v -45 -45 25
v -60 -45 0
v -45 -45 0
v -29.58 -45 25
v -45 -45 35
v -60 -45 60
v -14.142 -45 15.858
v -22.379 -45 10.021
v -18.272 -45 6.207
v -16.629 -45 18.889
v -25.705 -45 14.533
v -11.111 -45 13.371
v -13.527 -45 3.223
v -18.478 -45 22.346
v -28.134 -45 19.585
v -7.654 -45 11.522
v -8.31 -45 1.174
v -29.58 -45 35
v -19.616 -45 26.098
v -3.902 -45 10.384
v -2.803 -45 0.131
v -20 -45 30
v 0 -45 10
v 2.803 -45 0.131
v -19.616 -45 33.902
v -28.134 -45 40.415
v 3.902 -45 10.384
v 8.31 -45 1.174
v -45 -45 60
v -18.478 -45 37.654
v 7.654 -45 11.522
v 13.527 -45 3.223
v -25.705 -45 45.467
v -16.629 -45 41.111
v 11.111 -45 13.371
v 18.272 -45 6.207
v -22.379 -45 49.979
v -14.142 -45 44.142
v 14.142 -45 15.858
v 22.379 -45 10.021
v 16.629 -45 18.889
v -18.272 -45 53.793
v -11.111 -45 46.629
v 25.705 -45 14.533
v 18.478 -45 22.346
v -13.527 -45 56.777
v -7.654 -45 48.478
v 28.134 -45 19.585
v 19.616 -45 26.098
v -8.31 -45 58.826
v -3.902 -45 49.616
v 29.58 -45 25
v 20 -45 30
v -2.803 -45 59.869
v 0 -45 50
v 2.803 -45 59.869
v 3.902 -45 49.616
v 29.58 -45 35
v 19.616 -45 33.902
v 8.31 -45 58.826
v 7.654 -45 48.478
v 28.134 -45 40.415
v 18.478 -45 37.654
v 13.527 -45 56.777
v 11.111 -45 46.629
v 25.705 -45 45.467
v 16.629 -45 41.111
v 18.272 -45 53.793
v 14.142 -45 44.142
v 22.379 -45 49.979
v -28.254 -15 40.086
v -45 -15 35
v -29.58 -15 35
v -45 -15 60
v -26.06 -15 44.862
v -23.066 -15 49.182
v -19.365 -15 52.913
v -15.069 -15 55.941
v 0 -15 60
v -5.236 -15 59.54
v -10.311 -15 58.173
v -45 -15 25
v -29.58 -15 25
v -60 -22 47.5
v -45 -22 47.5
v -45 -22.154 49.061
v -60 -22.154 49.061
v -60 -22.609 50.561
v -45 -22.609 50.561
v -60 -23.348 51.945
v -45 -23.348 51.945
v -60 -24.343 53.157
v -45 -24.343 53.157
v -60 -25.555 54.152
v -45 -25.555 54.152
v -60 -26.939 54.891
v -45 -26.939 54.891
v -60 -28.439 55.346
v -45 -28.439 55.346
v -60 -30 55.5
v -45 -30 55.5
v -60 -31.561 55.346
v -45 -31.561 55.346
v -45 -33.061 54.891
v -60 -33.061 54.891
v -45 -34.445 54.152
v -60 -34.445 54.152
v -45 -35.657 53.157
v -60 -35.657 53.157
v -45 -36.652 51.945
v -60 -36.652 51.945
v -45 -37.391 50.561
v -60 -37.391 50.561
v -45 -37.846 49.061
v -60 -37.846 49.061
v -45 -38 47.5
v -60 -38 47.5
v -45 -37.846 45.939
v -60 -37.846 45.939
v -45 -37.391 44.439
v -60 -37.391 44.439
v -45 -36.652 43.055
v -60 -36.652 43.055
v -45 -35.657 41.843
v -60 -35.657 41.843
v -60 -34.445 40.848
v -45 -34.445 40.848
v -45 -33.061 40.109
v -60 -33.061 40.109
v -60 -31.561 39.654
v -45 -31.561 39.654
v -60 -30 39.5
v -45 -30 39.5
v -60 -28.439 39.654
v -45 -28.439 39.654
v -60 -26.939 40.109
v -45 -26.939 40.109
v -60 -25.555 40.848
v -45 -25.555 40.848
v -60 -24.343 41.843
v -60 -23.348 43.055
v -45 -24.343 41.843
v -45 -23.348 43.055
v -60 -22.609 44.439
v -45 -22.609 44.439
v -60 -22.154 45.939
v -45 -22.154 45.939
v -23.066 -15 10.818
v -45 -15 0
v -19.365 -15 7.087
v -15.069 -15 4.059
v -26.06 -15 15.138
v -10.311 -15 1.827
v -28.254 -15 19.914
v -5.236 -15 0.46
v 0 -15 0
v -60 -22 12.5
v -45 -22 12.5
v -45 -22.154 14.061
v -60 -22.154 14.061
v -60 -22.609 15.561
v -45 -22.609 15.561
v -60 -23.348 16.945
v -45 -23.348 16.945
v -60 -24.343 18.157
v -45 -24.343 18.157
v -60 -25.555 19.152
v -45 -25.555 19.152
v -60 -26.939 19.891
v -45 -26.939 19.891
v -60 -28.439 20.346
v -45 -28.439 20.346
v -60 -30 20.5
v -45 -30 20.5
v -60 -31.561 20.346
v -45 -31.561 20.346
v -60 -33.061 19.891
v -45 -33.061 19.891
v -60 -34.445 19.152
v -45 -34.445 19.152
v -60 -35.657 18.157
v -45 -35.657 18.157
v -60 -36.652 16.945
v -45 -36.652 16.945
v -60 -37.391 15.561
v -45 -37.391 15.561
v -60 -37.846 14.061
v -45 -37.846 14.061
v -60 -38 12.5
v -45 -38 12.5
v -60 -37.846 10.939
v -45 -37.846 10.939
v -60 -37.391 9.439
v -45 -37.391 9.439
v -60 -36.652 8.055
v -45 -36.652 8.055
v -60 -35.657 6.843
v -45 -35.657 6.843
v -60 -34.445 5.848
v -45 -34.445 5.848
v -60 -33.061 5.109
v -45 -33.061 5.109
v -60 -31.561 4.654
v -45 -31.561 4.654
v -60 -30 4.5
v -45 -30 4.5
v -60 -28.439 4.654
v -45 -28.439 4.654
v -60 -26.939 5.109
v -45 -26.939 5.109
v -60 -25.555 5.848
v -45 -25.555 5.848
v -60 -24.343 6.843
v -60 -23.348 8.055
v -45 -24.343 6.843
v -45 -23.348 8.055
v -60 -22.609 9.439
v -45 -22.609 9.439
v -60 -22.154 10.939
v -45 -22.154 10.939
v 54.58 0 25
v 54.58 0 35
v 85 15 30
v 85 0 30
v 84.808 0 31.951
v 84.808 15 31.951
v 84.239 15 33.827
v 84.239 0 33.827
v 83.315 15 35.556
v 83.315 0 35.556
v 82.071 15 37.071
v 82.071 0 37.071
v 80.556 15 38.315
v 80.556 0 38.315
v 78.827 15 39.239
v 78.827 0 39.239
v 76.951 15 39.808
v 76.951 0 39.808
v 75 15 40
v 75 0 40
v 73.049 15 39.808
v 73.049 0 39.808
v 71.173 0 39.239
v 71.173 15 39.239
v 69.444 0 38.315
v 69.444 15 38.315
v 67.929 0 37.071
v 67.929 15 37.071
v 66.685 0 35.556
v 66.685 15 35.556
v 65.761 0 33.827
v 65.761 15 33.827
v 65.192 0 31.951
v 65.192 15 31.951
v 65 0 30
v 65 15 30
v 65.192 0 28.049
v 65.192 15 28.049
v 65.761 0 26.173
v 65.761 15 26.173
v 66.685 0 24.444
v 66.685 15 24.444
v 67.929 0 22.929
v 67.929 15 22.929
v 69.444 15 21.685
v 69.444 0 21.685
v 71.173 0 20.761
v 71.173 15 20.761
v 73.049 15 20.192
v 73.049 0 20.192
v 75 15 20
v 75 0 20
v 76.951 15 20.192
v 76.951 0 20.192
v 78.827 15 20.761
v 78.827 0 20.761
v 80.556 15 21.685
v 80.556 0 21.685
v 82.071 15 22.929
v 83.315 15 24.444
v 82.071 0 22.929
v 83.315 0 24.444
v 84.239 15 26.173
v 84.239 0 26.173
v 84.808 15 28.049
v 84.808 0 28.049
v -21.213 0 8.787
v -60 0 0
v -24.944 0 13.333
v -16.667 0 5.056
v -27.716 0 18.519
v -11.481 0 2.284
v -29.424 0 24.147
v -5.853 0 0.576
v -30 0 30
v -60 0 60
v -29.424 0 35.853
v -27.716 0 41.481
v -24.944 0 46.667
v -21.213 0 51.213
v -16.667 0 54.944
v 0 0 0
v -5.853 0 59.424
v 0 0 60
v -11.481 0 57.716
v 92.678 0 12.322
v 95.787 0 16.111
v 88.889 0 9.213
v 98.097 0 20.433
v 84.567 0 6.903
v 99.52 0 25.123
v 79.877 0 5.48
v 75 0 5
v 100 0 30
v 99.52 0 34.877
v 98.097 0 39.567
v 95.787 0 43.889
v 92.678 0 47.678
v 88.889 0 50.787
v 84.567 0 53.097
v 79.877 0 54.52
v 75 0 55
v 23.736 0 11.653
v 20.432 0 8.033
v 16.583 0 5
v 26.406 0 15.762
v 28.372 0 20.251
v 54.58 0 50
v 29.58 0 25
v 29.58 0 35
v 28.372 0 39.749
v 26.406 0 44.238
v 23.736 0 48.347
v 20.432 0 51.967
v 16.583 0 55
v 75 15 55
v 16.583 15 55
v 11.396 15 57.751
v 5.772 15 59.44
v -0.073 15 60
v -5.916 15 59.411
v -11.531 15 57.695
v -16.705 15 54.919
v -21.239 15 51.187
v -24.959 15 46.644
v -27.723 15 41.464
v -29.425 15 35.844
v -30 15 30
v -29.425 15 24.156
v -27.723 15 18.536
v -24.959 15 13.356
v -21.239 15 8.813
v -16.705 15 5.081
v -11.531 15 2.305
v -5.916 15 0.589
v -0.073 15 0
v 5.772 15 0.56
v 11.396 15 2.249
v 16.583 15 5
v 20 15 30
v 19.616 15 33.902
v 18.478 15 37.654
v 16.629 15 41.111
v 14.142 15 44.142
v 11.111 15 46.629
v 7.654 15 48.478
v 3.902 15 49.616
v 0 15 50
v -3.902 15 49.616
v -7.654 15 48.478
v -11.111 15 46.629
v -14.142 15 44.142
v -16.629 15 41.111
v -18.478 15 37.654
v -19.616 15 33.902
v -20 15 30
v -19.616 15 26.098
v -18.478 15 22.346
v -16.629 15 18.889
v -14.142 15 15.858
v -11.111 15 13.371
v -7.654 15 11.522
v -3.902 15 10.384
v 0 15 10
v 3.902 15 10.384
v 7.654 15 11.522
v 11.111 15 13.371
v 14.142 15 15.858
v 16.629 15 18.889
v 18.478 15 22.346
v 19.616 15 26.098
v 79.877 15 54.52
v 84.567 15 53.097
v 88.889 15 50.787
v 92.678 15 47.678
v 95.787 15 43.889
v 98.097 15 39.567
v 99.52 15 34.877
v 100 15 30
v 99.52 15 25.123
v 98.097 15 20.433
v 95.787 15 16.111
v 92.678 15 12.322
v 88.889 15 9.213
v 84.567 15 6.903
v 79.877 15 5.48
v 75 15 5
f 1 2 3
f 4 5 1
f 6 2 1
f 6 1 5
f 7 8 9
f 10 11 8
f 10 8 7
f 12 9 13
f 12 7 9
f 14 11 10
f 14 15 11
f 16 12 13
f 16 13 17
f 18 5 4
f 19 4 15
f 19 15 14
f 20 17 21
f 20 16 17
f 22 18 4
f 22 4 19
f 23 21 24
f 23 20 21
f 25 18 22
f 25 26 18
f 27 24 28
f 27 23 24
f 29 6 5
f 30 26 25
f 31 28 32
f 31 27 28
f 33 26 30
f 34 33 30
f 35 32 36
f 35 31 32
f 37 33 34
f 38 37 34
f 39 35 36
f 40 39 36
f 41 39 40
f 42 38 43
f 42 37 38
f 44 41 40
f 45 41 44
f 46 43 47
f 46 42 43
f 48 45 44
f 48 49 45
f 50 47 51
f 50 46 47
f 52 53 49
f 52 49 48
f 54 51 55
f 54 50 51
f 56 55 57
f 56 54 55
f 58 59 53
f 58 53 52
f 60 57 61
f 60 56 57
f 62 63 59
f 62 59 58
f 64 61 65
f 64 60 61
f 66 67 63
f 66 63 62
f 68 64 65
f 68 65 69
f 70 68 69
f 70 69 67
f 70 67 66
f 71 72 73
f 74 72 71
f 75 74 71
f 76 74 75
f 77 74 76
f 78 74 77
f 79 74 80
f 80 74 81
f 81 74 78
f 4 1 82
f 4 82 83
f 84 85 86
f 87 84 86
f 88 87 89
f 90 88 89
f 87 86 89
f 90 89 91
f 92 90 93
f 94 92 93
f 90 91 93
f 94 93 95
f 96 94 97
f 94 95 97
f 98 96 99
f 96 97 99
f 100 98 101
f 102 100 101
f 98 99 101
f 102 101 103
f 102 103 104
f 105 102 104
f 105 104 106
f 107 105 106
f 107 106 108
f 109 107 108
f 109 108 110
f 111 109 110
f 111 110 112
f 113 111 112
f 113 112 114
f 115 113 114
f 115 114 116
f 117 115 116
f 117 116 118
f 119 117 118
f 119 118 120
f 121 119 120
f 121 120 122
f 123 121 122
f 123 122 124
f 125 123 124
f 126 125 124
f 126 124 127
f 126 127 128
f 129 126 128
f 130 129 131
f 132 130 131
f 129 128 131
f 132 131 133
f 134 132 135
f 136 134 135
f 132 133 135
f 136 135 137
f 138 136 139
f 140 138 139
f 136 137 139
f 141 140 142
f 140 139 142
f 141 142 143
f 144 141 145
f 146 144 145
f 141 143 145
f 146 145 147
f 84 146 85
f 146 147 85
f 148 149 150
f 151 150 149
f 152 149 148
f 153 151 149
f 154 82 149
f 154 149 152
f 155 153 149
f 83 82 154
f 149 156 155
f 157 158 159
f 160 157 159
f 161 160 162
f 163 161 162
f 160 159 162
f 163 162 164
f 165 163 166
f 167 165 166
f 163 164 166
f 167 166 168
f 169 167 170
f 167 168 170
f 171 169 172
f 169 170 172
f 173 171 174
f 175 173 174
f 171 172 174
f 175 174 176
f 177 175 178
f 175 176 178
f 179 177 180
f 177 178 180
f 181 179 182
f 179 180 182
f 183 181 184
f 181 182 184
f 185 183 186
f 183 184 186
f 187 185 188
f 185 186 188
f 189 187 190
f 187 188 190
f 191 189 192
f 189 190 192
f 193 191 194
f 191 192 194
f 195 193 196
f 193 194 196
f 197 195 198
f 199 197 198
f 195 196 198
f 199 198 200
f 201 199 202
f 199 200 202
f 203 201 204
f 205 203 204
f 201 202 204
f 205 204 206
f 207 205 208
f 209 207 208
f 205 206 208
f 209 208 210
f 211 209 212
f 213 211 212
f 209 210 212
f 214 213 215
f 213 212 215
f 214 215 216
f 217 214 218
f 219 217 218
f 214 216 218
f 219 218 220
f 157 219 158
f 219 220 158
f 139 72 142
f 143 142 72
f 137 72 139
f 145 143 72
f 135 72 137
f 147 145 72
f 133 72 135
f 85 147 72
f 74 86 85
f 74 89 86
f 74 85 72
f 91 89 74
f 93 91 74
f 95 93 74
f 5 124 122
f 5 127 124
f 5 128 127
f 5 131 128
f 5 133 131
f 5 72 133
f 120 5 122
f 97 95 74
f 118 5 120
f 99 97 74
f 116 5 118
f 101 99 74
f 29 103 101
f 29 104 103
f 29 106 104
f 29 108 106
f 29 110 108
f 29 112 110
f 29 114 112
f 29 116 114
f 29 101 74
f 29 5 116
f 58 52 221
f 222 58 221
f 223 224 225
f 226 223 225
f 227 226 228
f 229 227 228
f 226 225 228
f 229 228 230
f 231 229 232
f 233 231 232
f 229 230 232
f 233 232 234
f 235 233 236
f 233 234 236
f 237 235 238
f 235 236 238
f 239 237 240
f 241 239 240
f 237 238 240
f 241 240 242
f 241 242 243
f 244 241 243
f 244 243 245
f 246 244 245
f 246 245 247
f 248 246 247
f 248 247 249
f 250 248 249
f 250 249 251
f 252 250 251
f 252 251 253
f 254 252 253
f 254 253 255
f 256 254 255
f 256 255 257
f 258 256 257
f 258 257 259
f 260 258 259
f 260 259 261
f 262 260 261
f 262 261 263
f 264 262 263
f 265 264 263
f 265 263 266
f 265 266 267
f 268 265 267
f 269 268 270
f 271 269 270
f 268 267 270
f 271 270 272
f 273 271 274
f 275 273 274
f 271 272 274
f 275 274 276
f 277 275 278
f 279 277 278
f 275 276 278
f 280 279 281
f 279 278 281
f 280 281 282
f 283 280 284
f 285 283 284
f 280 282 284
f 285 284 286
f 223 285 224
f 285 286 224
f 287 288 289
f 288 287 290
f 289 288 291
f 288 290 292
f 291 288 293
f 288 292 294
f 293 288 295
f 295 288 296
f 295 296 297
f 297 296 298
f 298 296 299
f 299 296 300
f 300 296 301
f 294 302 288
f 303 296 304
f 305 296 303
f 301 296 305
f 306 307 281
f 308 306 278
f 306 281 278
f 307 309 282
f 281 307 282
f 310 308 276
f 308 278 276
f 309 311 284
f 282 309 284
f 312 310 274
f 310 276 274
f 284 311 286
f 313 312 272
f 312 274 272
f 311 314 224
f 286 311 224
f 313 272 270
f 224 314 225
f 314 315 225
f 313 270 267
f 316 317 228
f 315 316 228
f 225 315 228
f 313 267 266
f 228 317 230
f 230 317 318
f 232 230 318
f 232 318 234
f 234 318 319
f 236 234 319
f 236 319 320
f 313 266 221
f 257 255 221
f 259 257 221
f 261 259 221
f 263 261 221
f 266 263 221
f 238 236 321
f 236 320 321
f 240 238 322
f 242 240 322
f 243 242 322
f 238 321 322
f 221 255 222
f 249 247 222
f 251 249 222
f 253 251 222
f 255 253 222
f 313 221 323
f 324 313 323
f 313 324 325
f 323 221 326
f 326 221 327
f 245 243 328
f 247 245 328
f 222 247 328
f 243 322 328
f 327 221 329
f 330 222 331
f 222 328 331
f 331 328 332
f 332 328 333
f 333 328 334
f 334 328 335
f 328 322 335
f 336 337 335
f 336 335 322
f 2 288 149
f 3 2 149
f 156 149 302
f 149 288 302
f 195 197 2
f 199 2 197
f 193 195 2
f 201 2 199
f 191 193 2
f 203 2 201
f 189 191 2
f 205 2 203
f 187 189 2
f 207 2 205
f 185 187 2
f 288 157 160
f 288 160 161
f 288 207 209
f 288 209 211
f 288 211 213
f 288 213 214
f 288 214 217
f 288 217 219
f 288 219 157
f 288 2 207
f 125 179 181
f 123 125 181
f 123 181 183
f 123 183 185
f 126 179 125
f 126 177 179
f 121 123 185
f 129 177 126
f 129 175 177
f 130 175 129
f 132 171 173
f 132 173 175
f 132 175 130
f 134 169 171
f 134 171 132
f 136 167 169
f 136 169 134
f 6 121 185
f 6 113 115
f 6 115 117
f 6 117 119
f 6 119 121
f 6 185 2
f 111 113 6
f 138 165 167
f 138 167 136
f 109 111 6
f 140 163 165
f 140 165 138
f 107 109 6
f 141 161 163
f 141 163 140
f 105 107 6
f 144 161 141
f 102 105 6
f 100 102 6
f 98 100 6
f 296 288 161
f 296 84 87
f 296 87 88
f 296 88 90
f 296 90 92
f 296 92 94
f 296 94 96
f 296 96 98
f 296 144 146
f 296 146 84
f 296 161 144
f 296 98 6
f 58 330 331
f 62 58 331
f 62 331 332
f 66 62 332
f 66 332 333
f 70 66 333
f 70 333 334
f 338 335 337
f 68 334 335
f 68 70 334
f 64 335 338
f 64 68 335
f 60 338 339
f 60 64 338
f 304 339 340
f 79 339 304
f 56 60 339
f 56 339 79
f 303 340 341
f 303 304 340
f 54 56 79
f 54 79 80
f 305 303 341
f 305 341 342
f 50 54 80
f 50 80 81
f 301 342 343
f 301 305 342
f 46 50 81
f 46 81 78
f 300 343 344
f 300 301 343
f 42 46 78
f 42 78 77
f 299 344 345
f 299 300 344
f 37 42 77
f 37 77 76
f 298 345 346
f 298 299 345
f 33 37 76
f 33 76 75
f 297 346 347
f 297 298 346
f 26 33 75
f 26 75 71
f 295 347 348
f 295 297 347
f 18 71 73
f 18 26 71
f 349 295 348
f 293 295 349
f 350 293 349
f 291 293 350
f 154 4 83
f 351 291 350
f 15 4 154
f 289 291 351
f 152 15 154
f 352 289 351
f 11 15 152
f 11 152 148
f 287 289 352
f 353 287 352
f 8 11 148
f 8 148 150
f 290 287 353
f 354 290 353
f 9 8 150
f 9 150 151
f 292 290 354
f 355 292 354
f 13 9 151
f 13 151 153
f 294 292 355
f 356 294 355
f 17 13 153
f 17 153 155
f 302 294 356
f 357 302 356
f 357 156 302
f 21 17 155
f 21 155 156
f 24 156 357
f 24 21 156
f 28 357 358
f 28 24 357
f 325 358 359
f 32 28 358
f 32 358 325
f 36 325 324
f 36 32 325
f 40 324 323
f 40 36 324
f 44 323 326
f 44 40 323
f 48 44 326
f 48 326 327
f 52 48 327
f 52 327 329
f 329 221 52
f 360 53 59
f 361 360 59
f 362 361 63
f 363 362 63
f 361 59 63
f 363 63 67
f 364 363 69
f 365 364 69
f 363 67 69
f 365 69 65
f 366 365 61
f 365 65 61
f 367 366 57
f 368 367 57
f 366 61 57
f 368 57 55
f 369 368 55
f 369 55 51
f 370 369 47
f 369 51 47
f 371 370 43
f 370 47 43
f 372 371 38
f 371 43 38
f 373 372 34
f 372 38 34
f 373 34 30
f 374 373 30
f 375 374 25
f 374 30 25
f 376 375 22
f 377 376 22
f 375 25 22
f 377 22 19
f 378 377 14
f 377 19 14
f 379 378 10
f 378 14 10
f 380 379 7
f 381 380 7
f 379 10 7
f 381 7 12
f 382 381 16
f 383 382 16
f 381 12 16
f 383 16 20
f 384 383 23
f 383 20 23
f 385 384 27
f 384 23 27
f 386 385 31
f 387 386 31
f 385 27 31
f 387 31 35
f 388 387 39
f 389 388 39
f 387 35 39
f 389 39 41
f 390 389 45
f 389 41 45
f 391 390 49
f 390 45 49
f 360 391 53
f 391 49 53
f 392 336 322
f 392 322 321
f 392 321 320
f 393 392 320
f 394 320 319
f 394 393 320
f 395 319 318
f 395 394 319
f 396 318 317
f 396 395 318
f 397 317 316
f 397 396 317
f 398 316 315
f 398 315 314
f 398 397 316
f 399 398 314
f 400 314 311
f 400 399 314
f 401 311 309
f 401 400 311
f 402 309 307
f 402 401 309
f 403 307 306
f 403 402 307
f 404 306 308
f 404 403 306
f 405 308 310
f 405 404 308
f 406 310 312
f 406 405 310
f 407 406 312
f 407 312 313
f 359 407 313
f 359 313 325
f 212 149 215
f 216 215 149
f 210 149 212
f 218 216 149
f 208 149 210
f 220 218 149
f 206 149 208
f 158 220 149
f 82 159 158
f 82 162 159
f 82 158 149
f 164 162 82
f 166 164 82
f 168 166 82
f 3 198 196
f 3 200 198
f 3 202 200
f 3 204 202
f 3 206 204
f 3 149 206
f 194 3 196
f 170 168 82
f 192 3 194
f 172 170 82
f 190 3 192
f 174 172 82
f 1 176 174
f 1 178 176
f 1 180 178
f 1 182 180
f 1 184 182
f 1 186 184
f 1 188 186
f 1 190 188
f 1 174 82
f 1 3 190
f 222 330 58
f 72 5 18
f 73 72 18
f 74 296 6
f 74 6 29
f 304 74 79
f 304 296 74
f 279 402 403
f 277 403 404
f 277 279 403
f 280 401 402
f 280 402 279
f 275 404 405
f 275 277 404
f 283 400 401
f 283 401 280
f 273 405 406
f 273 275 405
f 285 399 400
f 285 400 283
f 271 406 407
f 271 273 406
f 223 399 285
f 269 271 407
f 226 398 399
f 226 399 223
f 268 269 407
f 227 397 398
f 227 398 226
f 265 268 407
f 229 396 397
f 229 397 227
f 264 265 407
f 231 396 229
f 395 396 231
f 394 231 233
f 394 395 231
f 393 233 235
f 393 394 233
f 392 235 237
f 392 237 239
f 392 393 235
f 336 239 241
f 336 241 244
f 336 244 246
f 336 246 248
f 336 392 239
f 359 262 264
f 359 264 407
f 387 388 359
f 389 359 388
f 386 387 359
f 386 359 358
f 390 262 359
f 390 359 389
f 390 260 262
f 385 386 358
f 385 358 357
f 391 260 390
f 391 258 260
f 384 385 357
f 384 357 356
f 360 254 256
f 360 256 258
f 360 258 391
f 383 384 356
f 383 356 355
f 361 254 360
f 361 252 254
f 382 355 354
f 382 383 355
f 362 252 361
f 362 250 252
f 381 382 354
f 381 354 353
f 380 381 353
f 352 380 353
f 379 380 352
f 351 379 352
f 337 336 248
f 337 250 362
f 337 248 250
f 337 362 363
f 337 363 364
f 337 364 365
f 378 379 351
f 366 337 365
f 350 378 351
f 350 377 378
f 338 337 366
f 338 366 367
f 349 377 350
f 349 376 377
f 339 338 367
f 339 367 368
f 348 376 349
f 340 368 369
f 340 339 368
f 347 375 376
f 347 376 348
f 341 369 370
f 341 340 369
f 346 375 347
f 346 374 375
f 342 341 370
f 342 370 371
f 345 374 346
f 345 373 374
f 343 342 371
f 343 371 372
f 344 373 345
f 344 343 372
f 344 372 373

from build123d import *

# Parameters (mm, degrees)
F0_W      = 60
F0_H      = 60
F1_DEPTH  = 45
F2_W      = 45
F2_H      = 25
F3_DEPTH  = 30
F4_R      = 8
F5_DEPTH  = 15
F6_R      = 8
F7_DEPTH  = 25
F8_R      = 30
F9_DEPTH  = 60
F10_R     = 20
F11_DEPTH = 60
F13_DEPTH = 15
F14_R     = 10
F15_DEPTH = 25
F17_DEPTH = 60
F19_DEPTH = 25


with BuildPart() as f1:
    # F0 (on Front) → F1 (new body)
    with BuildSketch(Plane.XZ):
        with Locations((-30, 30)):
            Rectangle(F0_W, F0_H)
    extrude(amount=F1_DEPTH)

    # F2 (on face) → F3 (cut)
    with BuildSketch(Plane.XZ.offset(45)):
        with Locations((-22.5, 12.5)):
            Rectangle(F2_W, F2_H)
        with Locations((-22.5, 47.5)):
            Rectangle(F2_W, F2_H)
    extrude(amount=-F3_DEPTH, mode=Mode.SUBTRACT)

    # F4 (on face) → F5 (cut)
    with BuildSketch(Plane.YZ.offset(-45)):
        with Locations((-30, 12.5)):
            Circle(F4_R)
    extrude(amount=-F5_DEPTH, mode=Mode.SUBTRACT)

    # F6 (on face) → F7 (cut)
    with BuildSketch(Plane.YZ.offset(-45)):
        with Locations((-30, 47.5)):
            Circle(F6_R)
    extrude(amount=-F7_DEPTH, mode=Mode.SUBTRACT)

    # F8 (on face) → F9 (join)
    with BuildSketch(Plane.XZ.offset(45)):
        with Locations((0, 30)):
            Circle(F8_R)
    extrude(amount=-F9_DEPTH)

    # F10 (on face) → F11 (cut)
    with BuildSketch(Plane.XZ.offset(45)):
        with Locations((0, 30)):
            Circle(F10_R)
    extrude(amount=-F11_DEPTH, mode=Mode.SUBTRACT)

    # F12 (on face) → F13 (join)
    with BuildSketch(Plane(origin=(0, 15, 0), x_dir=(-1, 0, 0), z_dir=(0, 1, 0))):
        with BuildLine():
            Line((-75, 5), (-75, 30))
            Line((-75, 30), (-75, 55))
            ThreePointArc((-75, 55), (-100, 30), (-75, 5))
        make_face()
        with BuildLine():
            Line((-75, 55), (-75, 30))
            Line((-75, 30), (-75, 5))
            Line((-75, 5), (-16.5831239518, 5))
            ThreePointArc((-16.5831239518, 5), (-30, 30), (-16.5831239518, 55))
            Line((-16.5831239518, 55), (-75, 55))
        make_face()
    extrude(amount=-F13_DEPTH)

    # F14 (on face) → F15 (cut)
    with BuildSketch(Plane.XZ):
        with Locations((75, 30)):
            Circle(F14_R)
    extrude(amount=-F15_DEPTH, mode=Mode.SUBTRACT)

    # F16 (on face) → F17 (join)
    with BuildSketch(Plane(origin=(0, 15, 0), x_dir=(-1, 0, 0), z_dir=(0, 1, 0))):
        with BuildLine():
            Line((-29.5803989155, 25), (-29.5803989155, 35))
            ThreePointArc((-29.5803989155, 35), (-30, 30), (-29.5803989155, 25))
        make_face()
        with BuildLine():
            ThreePointArc((-29.5803989155, 25), (-30, 30), (-29.5803989155, 35))
            Line((-29.5803989155, 35), (-54.5803989155, 35))
            Line((-54.5803989155, 35), (-54.5803989155, 25))
            Line((-54.5803989155, 25), (-29.5803989155, 25))
        make_face()
    extrude(amount=-F17_DEPTH)

    # F18 (on face) → F19 (cut)
    with BuildSketch(Plane(origin=(0, 0, 25), x_dir=(1, 0, 0), z_dir=(0, 0, -1))):
        Polygon((54.5803989155, 45), (29.5803989155, 45), (54.5803989155, 0), align=None)
    extrude(amount=-F19_DEPTH, mode=Mode.SUBTRACT)


solid = f1.part
